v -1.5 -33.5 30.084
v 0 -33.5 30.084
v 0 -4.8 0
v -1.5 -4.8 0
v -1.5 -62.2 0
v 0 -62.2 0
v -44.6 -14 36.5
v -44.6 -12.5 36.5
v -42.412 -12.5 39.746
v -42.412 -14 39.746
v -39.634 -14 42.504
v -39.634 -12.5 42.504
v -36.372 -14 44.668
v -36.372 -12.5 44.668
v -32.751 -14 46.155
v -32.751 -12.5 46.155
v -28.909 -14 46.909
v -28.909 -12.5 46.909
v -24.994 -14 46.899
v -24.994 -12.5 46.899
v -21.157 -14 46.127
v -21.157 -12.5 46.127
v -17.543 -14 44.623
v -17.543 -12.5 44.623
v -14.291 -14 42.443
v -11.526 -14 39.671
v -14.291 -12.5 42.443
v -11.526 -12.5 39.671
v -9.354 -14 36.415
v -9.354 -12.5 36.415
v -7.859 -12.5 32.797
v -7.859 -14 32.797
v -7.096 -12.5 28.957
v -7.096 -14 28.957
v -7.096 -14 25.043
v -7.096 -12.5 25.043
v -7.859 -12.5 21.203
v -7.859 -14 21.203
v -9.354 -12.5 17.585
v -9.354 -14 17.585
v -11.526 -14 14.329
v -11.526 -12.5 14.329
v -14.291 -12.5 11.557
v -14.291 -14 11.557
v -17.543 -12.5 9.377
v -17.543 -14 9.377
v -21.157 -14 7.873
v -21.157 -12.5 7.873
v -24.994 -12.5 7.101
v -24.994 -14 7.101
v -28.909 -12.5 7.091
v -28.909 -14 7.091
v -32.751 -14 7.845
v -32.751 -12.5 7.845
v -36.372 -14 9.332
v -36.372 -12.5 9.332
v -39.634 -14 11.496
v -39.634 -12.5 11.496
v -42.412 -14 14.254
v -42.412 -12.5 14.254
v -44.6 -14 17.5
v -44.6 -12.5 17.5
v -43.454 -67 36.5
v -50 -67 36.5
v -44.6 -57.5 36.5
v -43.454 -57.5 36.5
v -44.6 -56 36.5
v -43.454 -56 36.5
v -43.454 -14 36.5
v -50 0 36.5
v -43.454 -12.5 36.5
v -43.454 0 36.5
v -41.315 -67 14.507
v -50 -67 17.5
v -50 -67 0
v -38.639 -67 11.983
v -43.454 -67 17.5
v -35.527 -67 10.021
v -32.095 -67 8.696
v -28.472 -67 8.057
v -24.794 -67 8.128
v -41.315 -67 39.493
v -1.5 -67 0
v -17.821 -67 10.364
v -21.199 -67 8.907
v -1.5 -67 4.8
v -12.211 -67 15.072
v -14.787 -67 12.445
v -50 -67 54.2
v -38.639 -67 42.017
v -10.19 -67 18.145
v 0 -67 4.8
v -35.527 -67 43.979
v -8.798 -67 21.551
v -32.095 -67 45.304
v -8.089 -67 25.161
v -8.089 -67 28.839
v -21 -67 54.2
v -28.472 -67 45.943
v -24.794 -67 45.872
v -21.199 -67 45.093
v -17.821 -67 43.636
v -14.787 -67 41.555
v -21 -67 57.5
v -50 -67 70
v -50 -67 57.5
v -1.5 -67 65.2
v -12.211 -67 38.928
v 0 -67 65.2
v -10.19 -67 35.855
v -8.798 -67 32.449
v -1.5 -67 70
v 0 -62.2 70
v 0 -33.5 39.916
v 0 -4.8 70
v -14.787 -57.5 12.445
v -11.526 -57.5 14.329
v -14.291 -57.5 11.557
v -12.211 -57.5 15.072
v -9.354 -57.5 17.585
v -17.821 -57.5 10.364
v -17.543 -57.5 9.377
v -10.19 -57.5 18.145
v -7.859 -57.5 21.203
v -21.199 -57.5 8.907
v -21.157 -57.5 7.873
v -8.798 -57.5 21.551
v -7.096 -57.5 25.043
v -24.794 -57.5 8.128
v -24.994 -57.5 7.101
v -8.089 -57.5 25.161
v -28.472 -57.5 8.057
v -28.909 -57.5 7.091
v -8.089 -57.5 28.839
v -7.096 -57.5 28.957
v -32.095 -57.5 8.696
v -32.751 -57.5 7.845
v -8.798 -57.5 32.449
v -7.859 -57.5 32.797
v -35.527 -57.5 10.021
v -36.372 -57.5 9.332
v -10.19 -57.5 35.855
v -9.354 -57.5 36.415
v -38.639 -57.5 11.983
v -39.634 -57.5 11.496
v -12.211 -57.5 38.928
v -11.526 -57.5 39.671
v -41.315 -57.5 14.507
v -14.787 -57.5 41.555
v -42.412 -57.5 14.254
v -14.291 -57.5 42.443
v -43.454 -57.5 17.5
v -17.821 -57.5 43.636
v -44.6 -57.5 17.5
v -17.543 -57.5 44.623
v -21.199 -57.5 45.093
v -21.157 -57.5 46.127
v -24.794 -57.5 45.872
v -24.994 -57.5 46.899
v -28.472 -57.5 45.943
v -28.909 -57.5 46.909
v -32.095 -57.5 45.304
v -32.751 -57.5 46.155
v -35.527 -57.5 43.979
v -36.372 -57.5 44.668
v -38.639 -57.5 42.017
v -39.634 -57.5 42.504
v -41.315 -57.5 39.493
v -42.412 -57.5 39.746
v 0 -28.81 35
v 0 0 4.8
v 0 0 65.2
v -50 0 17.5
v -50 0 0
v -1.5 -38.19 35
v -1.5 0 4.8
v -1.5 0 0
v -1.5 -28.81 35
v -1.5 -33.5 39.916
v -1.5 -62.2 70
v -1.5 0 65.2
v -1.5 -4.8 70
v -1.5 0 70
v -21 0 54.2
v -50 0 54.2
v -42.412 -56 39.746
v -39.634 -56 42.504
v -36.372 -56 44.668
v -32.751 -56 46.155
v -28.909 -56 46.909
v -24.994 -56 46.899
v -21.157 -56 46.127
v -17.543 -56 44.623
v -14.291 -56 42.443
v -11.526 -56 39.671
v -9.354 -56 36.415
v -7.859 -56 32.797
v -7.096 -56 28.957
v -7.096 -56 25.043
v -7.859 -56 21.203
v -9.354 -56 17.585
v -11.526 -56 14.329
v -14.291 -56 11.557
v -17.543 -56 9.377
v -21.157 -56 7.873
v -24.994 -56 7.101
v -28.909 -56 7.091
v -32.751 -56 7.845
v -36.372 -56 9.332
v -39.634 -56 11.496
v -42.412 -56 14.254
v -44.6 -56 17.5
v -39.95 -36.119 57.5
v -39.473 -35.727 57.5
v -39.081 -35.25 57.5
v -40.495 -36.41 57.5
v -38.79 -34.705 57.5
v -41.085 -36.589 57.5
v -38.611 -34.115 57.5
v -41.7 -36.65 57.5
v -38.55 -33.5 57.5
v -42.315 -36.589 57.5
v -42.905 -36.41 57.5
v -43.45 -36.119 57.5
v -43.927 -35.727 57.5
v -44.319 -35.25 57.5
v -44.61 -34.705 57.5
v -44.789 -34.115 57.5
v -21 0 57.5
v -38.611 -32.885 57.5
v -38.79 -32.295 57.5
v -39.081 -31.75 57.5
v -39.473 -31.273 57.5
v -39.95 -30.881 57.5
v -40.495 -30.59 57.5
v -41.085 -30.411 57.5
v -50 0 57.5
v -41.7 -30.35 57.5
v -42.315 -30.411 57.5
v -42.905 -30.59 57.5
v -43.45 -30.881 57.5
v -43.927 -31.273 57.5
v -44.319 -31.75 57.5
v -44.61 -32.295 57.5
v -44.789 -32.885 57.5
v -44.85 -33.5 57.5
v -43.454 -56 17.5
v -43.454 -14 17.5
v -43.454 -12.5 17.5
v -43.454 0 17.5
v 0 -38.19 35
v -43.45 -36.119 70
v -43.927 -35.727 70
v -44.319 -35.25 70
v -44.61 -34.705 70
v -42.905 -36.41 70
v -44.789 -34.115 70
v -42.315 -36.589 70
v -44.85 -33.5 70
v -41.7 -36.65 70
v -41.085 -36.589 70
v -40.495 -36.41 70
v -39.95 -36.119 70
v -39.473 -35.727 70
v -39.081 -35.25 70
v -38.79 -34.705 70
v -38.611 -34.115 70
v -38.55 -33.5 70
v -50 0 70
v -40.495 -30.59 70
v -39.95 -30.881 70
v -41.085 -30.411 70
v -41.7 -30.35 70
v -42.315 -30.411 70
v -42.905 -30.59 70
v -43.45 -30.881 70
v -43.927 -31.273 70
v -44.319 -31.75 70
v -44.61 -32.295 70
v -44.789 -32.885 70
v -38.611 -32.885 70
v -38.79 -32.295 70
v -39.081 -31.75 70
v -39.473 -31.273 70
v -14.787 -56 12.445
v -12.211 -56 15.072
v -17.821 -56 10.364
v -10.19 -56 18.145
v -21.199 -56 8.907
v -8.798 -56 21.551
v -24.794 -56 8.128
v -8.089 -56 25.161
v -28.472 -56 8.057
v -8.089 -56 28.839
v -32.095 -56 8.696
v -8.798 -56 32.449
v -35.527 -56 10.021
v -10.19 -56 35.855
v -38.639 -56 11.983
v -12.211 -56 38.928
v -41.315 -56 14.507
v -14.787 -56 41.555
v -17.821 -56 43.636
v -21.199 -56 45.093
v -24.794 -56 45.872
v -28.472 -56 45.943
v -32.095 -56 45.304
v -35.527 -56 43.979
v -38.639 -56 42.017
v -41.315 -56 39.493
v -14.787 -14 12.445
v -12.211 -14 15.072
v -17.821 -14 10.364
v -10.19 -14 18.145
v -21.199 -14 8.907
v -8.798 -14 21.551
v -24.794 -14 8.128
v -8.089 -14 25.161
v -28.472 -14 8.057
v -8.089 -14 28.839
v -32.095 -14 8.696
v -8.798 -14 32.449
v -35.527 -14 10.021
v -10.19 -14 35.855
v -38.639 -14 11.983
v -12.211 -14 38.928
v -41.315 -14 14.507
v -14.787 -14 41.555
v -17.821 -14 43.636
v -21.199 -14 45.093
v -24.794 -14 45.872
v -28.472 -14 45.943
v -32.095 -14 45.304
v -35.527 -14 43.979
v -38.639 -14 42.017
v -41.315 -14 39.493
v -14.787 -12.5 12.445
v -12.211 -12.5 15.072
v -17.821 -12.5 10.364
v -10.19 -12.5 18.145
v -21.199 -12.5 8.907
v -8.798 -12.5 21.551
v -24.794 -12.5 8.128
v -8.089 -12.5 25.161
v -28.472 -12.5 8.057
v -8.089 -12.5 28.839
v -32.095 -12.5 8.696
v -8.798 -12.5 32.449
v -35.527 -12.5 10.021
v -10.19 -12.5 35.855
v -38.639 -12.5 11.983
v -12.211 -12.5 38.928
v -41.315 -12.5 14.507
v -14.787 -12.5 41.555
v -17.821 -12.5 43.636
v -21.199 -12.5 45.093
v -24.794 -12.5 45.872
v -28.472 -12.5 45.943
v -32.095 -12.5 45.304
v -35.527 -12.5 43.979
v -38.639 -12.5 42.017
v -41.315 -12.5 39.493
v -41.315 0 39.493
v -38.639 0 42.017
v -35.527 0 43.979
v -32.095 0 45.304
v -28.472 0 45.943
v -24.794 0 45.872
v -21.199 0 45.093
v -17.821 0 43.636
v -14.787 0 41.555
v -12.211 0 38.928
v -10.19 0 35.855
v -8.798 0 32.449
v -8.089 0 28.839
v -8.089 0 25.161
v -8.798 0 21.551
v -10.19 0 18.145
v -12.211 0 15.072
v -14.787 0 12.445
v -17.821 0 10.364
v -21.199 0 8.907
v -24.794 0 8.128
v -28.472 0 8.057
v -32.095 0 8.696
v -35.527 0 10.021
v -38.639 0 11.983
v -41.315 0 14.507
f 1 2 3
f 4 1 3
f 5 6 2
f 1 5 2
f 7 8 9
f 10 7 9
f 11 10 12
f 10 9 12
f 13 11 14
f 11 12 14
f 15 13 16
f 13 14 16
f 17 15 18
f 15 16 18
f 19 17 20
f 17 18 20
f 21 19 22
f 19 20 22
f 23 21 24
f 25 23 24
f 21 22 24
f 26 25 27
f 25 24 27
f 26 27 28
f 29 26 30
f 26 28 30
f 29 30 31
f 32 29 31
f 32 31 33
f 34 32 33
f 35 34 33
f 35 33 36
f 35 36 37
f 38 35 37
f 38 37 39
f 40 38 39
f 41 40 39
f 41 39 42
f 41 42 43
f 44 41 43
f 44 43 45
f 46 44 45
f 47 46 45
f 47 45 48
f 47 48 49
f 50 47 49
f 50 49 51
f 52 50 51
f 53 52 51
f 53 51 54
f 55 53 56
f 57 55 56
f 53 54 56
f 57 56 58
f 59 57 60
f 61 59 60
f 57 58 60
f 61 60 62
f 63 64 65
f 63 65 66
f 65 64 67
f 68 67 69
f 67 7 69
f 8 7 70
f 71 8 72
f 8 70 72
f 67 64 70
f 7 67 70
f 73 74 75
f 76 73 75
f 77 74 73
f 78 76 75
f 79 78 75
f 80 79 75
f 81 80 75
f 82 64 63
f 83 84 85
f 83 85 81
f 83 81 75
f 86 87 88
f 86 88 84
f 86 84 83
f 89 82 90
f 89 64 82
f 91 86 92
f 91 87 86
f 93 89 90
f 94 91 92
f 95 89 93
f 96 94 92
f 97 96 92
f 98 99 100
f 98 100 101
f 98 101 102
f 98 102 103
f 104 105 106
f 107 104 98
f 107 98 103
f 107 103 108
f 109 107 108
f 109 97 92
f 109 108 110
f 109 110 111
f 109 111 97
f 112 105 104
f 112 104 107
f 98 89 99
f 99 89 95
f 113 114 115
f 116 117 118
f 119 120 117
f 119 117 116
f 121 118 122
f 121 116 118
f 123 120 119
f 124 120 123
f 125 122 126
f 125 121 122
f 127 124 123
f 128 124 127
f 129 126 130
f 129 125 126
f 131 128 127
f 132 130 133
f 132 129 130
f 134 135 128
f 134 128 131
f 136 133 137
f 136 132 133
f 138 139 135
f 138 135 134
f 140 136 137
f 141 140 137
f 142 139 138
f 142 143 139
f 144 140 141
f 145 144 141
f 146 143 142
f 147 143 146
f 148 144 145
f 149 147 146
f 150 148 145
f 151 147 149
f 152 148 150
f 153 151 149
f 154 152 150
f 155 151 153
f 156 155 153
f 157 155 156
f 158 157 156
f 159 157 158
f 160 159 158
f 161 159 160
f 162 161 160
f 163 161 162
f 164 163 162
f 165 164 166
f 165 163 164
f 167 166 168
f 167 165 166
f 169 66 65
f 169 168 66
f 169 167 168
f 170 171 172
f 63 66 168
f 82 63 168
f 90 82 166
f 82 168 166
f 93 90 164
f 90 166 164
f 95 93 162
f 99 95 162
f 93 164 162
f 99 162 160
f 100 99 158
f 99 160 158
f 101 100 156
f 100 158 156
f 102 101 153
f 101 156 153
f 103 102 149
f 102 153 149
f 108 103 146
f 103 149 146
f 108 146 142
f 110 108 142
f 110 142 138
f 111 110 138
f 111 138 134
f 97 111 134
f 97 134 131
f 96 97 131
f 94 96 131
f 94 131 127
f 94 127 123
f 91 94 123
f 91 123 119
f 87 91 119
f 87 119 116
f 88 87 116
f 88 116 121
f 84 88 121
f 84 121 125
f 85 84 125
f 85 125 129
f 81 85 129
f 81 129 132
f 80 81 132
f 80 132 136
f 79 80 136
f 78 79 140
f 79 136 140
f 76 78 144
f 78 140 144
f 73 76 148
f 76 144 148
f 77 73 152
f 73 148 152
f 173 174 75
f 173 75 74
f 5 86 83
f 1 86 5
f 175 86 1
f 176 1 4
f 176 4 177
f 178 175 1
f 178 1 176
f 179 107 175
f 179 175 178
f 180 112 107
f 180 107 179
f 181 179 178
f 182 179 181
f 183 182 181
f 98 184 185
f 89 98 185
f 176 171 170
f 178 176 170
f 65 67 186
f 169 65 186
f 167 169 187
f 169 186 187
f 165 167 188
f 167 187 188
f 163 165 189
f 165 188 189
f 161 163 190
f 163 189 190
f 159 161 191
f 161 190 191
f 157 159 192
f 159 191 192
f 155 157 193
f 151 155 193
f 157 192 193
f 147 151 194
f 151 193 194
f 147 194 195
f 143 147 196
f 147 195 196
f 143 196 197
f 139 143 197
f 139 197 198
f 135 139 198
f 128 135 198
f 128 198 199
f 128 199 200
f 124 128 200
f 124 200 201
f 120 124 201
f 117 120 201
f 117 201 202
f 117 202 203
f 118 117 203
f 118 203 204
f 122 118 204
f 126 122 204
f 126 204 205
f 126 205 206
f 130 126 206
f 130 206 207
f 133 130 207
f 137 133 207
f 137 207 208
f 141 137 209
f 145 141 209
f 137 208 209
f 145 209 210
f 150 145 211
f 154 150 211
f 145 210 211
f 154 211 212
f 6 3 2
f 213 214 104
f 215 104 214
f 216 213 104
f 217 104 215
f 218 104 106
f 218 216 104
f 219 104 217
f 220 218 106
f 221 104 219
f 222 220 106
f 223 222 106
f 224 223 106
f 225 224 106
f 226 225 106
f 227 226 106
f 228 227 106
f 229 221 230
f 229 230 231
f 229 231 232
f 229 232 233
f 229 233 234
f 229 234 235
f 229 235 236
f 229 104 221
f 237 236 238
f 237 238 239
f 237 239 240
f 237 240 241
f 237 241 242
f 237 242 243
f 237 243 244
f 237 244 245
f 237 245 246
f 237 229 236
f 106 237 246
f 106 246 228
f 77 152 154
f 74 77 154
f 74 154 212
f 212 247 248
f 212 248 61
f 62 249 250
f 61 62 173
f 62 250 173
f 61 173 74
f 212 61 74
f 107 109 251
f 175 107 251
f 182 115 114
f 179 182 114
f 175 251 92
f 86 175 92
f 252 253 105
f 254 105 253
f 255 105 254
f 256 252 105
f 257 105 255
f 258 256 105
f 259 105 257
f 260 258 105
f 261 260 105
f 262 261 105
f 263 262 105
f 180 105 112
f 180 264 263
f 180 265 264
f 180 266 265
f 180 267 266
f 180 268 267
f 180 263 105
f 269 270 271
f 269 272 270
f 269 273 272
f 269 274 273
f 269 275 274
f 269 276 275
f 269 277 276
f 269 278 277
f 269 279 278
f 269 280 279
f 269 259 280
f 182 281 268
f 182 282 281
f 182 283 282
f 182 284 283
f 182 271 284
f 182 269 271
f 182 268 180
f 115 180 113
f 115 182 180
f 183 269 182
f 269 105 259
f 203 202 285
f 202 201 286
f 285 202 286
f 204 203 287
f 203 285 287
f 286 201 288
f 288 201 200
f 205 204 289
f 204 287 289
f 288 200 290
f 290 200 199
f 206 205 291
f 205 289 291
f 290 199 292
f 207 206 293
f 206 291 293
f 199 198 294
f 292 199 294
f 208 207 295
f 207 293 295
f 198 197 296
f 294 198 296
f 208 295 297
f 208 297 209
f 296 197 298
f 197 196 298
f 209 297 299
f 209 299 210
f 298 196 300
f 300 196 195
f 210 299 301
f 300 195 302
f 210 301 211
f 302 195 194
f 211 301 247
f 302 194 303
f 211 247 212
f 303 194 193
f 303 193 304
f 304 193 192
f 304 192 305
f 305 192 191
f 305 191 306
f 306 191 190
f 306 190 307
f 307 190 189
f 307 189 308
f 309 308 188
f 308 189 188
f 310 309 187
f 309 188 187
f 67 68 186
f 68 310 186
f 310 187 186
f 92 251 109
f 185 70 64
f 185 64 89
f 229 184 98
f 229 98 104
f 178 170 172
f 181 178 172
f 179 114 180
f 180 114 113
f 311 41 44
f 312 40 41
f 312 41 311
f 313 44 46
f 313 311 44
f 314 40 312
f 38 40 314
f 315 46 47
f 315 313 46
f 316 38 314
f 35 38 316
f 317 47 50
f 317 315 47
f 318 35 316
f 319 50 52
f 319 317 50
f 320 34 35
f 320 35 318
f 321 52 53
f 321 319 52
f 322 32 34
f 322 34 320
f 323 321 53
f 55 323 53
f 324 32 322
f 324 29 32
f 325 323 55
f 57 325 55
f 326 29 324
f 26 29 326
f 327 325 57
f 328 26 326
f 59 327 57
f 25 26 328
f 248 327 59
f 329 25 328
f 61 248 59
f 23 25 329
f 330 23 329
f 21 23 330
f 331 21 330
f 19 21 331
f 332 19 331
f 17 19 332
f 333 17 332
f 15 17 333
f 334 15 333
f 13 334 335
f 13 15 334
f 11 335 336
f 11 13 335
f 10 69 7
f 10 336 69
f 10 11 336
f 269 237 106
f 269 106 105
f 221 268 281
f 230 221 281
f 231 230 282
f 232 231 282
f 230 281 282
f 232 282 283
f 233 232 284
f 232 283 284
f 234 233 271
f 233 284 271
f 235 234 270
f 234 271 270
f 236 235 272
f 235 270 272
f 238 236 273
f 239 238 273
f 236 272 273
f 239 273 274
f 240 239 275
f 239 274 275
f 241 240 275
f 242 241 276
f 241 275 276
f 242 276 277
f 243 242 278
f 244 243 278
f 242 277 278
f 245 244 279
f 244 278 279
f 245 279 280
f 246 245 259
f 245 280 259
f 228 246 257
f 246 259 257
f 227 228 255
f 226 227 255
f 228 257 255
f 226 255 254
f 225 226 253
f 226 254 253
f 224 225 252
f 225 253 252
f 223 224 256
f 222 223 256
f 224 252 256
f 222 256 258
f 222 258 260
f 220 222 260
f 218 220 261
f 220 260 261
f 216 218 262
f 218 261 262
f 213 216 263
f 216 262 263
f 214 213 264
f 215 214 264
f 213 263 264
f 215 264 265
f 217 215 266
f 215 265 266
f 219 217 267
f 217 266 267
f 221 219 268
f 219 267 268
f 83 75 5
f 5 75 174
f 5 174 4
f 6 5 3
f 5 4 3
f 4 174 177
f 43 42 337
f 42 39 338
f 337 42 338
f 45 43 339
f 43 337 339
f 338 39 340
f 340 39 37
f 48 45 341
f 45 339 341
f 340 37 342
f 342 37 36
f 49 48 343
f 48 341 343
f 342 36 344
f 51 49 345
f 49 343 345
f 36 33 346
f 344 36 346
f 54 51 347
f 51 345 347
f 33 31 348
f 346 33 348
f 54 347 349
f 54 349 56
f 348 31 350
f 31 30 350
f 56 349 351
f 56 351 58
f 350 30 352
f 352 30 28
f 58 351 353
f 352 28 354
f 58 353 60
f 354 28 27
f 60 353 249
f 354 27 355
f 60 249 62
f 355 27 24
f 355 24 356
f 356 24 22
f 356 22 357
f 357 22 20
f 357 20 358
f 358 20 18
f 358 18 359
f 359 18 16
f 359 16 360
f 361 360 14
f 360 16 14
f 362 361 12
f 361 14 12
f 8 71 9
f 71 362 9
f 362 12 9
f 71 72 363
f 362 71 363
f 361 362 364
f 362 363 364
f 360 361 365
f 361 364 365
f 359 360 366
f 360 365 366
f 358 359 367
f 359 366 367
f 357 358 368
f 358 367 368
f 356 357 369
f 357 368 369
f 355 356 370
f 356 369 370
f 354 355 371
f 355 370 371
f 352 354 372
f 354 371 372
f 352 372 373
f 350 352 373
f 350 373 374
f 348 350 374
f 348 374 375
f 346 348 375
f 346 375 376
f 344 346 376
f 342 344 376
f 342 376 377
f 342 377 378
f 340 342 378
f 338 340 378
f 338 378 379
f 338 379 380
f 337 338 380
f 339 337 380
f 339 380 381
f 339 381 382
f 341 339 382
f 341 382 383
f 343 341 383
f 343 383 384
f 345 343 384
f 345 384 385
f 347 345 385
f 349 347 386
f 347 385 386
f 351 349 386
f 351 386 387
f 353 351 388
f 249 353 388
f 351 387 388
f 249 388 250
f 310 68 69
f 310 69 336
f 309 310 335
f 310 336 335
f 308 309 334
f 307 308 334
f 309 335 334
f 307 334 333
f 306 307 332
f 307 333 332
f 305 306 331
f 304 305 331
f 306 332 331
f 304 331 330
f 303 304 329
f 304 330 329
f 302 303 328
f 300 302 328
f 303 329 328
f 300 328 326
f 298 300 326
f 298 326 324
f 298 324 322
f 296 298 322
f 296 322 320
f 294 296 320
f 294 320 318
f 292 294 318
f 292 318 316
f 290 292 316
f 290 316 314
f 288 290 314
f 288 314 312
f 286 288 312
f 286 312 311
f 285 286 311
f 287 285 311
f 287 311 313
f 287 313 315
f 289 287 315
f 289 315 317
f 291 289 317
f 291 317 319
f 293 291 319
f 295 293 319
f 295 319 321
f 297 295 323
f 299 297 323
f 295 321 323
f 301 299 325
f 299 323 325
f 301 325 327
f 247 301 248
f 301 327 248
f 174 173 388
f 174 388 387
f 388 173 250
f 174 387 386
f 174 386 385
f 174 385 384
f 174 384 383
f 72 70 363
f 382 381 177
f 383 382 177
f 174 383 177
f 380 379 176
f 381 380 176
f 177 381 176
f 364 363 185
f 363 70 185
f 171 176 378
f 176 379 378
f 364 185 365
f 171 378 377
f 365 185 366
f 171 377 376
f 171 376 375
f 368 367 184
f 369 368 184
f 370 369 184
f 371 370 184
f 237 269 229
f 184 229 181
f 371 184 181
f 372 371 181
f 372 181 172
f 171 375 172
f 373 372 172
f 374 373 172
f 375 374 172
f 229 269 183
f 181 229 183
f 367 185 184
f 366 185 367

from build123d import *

# Parameters (mm, degrees)
F0_W      = 50
F0_H      = 70
F1_DEPTH  = 67
F3_DEPTH  = 1.5
F4_W      = 29
F4_H      = 3.3
F5_DEPTH  = 67.001
F7_R      = 20
F8_DEPTH  = 1.5
F10_R     = 20
F11_DEPTH = 1.5
F12_R     = 3.15
F13_DEPTH = 12.5


with BuildPart() as f1:
    # F0 (on Front) → F1 (new body)
    with BuildSketch(Plane.XZ):
        with Locations((-25, 35)):
            Rectangle(F0_W, F0_H)
    extrude(amount=F1_DEPTH)

    # F2 (on face) → F3 (cut)
    with BuildSketch(Plane.YZ):
        Polygon((-67, 70), (-67, 65.2), (-38.1895705521, 35), (-33.5, 39.915755627), (-62.2, 70), align=None)
        Polygon((-33.5, 39.915755627), (-38.1895705521, 35), (-33.5, 30.084244373), (-28.8104294479, 35), align=None)
        Polygon((-67, 4.8), (-67, 0), (-62.2, 0), (-33.5, 30.084244373), (-38.1895705521, 35), align=None)
        Polygon((-4.8, 70), (-33.5, 39.915755627), (-28.8104294479, 35), (0, 65.2), (0, 70), align=None)
        Polygon((-33.5, 30.084244373), (-4.8, 0), (0, 0), (0, 4.8), (-28.8104294479, 35), align=None)
    extrude(amount=-F3_DEPTH, mode=Mode.SUBTRACT)

    # F4 (on face) → F5 (cut, through all)
    with BuildSketch(Plane(origin=(0, 0, 0), x_dir=(-1, 0, 0), z_dir=(0, 1, 0))):
        with Locations((35.5, 55.85)):
            Rectangle(F4_W, F4_H)
        with BuildLine():
            ThreePointArc((46, 27), (45.3525906995, 31.9175618569), (43.4544826719, 36.5))
            ThreePointArc((43.4544826719, 36.5), (8, 27), (43.4544826719, 17.5))
            ThreePointArc((43.4544826719, 17.5), (45.3525906995, 22.0824381431), (46, 27))
        make_face()
        with BuildLine():
            Line((50, 17.5), (50, 36.5))
            Line((50, 36.5), (43.4544826719, 36.5))
            ThreePointArc((43.4544826719, 36.5), (45.3525906995, 31.9175618569), (46, 27))
            ThreePointArc((46, 27), (45.3525906995, 22.0824381431), (43.4544826719, 17.5))
            Line((43.4544826719, 17.5), (50, 17.5))
        make_face()
    extrude(amount=-F5_DEPTH, mode=Mode.SUBTRACT)

    # F7 (on offset) → F8 (cut)
    with BuildSketch(Plane(origin=(0, -12.5, 0), x_dir=(-1, 0, 0), z_dir=(0, 1, 0))):
        with Locations((27, 27)):
            Circle(F7_R)
    extrude(amount=-F8_DEPTH, mode=Mode.SUBTRACT)

    # F10 (on offset) → F11 (cut)
    with BuildSketch(Plane(origin=(0, -56, 0), x_dir=(-1, 0, 0), z_dir=(0, 1, 0))):
        with Locations((27, 27)):
            Circle(F10_R)
    extrude(amount=-F11_DEPTH, mode=Mode.SUBTRACT)

    # F12 (on face) → F13 (cut, through all)
    with BuildSketch(Plane.XY.offset(70)):
        with Locations((-41.7, -33.5)):
            Circle(F12_R)
    extrude(amount=-F13_DEPTH, mode=Mode.SUBTRACT)


solid = f1.part
